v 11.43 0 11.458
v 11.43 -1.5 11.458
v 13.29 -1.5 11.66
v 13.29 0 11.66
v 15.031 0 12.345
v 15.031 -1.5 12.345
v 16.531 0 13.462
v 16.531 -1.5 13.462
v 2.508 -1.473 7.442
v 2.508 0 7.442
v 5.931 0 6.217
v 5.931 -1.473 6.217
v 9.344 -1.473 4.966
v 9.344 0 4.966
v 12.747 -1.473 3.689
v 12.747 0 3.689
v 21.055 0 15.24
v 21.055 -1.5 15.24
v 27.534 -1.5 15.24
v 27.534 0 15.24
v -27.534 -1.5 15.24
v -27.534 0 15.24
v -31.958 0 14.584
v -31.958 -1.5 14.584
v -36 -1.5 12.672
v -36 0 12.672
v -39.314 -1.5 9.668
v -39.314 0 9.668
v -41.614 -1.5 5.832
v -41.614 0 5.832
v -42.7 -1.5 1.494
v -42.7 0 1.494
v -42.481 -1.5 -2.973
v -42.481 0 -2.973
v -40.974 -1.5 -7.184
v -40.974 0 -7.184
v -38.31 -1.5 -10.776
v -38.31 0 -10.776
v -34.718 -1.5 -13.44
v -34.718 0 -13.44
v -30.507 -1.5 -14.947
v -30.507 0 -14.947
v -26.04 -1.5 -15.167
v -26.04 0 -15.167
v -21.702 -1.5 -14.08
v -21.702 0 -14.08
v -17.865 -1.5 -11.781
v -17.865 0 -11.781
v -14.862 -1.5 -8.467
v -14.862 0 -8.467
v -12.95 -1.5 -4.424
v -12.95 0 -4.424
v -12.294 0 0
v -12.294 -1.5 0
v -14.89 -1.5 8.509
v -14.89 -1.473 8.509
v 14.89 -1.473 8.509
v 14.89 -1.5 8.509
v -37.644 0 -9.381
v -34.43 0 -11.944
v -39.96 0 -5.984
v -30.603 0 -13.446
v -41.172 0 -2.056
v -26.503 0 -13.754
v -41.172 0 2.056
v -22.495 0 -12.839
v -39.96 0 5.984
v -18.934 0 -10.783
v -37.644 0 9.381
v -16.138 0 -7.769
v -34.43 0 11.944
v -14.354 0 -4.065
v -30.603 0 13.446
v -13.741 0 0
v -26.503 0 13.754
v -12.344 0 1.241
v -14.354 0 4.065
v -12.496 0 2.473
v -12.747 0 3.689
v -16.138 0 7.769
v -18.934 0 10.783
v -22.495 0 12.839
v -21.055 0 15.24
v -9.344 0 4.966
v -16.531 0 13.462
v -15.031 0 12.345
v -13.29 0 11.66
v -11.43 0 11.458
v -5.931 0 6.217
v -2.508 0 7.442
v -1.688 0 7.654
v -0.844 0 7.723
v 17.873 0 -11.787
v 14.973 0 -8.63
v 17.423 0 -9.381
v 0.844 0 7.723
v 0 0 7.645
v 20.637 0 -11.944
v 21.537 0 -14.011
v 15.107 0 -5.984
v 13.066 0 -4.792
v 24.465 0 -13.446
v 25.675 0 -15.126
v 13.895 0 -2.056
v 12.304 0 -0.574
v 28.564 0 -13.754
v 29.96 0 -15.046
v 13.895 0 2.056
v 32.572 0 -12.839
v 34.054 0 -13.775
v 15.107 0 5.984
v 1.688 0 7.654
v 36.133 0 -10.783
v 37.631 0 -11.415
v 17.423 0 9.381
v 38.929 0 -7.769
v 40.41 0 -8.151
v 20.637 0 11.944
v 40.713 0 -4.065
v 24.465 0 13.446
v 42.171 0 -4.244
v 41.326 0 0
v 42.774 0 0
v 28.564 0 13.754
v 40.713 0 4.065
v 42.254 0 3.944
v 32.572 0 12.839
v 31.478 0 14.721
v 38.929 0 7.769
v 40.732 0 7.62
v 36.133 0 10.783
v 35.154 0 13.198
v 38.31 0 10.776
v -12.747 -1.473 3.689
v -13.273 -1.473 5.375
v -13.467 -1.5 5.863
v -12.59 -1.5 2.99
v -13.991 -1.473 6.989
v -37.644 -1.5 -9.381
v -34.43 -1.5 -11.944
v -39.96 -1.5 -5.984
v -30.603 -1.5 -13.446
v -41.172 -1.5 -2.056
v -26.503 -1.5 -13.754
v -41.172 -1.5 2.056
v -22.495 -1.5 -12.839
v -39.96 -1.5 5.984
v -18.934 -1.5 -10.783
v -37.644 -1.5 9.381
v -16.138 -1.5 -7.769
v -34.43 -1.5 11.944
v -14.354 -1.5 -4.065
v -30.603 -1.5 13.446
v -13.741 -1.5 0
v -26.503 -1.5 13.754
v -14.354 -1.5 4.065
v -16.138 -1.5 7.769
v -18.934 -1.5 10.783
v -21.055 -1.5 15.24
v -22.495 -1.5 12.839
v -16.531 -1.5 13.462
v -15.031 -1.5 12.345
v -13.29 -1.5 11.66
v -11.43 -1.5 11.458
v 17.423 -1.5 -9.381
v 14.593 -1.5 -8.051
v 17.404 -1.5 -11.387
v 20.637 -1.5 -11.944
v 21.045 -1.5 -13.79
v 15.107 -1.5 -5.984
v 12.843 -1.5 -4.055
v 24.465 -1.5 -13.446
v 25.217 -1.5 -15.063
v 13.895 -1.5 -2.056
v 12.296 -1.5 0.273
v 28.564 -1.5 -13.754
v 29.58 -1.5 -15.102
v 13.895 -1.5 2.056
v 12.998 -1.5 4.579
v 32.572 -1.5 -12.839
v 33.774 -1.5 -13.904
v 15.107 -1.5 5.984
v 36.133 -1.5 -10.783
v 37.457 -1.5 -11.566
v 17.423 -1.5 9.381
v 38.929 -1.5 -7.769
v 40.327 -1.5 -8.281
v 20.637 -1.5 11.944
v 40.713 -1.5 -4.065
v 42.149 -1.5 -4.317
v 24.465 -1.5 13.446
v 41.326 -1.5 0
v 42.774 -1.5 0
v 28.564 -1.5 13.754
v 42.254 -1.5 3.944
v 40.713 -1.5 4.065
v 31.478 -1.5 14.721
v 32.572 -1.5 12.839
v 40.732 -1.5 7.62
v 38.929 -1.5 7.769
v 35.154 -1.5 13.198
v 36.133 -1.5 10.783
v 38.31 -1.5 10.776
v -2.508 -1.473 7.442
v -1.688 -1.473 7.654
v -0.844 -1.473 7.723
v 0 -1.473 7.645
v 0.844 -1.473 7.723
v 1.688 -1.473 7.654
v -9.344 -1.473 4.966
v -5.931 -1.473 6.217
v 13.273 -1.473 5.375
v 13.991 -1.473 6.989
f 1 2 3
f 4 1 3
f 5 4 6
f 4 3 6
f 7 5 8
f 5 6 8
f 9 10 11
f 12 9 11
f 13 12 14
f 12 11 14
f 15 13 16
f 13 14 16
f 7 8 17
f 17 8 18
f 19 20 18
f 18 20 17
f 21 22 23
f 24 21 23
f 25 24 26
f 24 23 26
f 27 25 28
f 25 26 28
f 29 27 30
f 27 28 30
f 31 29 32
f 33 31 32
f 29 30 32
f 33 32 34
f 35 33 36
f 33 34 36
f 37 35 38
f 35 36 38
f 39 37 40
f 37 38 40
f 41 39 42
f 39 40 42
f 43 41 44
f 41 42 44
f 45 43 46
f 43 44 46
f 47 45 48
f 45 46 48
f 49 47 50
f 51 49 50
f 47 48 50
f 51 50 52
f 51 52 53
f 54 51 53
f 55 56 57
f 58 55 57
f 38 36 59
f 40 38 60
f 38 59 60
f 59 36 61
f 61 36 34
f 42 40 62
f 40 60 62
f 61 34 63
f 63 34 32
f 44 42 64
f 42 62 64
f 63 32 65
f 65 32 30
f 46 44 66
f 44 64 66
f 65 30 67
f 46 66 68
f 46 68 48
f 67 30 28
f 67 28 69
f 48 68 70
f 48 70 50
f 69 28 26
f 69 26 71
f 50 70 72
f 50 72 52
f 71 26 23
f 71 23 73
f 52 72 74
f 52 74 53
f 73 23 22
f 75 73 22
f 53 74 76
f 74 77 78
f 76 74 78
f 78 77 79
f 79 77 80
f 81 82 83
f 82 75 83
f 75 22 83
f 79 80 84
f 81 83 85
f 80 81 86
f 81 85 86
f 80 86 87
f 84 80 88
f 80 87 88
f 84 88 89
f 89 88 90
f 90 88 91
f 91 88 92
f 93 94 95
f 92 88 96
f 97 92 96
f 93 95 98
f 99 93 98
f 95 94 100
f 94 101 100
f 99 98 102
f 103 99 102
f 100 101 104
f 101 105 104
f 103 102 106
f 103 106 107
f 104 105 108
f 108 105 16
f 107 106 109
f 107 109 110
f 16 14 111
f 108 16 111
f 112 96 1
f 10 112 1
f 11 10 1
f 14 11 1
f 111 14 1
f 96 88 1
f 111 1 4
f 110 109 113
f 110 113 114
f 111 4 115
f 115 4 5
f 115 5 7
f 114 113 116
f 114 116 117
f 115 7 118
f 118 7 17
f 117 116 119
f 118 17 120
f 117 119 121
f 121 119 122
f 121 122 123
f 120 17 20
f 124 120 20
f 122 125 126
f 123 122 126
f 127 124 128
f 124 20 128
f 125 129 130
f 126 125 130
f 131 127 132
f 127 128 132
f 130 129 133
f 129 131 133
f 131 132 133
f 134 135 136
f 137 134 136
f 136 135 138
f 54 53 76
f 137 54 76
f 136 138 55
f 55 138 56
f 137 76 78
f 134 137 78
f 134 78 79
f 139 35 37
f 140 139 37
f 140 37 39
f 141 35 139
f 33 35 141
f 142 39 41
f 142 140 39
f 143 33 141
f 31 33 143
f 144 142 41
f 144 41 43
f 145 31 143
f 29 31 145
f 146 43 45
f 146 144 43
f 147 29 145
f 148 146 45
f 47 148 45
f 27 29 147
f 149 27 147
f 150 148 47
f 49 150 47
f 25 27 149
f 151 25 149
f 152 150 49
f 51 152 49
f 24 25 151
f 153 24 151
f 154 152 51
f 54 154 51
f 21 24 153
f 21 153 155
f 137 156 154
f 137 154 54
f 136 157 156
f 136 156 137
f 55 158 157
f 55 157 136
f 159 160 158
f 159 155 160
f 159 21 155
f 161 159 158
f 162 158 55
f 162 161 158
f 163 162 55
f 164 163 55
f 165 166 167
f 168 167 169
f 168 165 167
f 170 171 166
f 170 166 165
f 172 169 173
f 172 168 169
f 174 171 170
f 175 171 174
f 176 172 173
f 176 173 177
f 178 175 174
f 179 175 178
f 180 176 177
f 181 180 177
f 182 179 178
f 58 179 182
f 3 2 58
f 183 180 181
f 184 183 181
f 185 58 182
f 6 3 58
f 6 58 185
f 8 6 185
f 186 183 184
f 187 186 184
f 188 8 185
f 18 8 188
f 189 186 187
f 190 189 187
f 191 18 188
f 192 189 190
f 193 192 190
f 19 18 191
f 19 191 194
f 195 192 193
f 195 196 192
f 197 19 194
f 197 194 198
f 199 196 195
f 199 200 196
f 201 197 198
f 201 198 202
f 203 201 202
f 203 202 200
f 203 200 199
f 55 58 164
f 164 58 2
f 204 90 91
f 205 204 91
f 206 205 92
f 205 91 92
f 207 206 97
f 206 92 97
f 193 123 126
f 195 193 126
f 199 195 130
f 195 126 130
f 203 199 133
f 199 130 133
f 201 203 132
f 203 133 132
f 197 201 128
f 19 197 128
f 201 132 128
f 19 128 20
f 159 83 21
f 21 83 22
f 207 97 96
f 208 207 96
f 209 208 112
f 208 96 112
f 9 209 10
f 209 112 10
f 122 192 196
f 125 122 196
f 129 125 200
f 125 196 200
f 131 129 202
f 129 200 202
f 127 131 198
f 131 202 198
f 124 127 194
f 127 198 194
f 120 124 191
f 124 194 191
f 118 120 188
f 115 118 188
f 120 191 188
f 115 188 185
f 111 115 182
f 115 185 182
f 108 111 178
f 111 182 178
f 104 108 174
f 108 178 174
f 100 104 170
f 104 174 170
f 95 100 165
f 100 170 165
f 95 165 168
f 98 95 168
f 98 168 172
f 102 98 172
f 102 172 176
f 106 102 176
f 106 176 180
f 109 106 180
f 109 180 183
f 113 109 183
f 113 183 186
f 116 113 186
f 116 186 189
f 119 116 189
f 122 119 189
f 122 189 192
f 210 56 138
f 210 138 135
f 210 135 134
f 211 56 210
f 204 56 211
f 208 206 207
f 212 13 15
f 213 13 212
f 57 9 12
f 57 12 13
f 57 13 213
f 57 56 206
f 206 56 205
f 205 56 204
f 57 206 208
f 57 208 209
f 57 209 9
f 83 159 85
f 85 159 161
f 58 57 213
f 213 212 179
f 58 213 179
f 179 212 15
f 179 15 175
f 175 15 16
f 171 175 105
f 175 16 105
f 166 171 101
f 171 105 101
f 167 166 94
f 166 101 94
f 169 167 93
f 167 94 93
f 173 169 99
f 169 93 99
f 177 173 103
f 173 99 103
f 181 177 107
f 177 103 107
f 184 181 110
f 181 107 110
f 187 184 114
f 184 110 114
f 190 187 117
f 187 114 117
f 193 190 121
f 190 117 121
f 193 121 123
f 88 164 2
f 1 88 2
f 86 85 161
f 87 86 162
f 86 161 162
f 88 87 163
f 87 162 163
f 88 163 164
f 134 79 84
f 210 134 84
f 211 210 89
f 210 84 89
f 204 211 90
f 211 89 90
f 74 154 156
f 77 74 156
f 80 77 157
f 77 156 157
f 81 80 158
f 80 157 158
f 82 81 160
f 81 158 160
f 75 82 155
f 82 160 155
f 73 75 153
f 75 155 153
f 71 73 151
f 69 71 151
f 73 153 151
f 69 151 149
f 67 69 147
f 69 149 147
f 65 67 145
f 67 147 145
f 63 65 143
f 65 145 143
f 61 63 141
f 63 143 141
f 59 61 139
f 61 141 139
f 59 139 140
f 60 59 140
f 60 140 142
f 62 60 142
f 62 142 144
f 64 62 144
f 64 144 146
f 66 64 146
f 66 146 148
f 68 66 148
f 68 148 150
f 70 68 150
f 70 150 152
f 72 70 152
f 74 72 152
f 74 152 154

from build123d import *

# Parameters (mm, degrees)
F1_DEPTH = 1.5
F2_R     = 13.7922
F3_DEPTH = 25.4
F5_DEPTH = 25.4
F8_DEPTH = 1.4732


# Not quite as in the source:
# - a variable given as a bare number and used for a length is read in inches; the dataset says mm whatever the document's units were


with BuildPart() as f1:
    # F0 (on Front) → F1 (new body)
    with BuildSketch(Plane.XZ):
        with BuildLine():
            ThreePointArc((-27.5336, 15.24), (-38.3099073453, -10.7763073453), (-12.2936, 0))
            ThreePointArc((-12.2936, 0), (-12.9572083605, 4.4481914045), (-14.8902413086, 8.509))
            ThreePointArc((-14.8902413086, 8.509), (-20.3718809326, 13.4524116797), (-27.5336, 15.24))
        make_face()
        with BuildLine():
            ThreePointArc((-27.5336, 15.24), (-20.3718809326, 13.4524116797), (-14.8902413086, 8.509))
            Line((-14.8902413086, 8.509), (14.8902413086, 8.509))
            ThreePointArc((14.8902413086, 8.509), (20.3718809326, 13.4524116797), (27.5336, 15.24))
            Line((27.5336, 15.24), (-27.5336, 15.24))
        make_face()
        with BuildLine():
            ThreePointArc((27.5336, 15.24), (20.3718809326, 13.4524116797), (14.8902413086, 8.509))
            ThreePointArc((14.8902413086, 8.509), (23.0854085955, -14.5763916395), (42.7736, 0))
            ThreePointArc((42.7736, 0), (38.3099073453, 10.7763073453), (27.5336, 15.24))
        make_face()
    extrude(amount=F1_DEPTH)

    # F2 (on face) → F3 (cut)
    with BuildSketch(Plane.XZ.offset(1.5)):
        with Locations((-27.5336, 0)):
            Circle(F2_R)
        with Locations((27.5336, 0)):
            Circle(F2_R)
        with BuildLine():
            Line((0, 40.3644442558), (-21.547392987, 18.4778384864))
            Line((-21.547392987, 18.4778384864), (-16.5919354635, 13.522380963))
            ThreePointArc((-16.5919354635, 13.522380963), (-14.2228731292, 11.9602304674), (-11.43, 11.4576071501))
            Line((-11.43, 11.4576071501), (0, 11.4576071501))
            Line((0, 11.4576071501), (0, 40.3644442558))
        make_face()
        with BuildLine():
            Line((21.547392987, 18.4778384864), (0, 40.3644442558))
            Line((0, 40.3644442558), (0, 11.4576071501))
            Line((0, 11.4576071501), (11.43, 11.4576071501))
            ThreePointArc((11.43, 11.4576071501), (14.2228731292, 11.9602304674), (16.5919354635, 13.522380963))
            Line((16.5919354635, 13.522380963), (21.547392987, 18.4778384864))
        make_face()
    extrude(amount=-F3_DEPTH, mode=Mode.SUBTRACT)

    # F4 (on face) → F5 (cut)
    with BuildSketch(Plane.XZ.offset(1.5)):
        Polygon((-9.2328525533, 17.0485330061), (-24.6466696262, 16.6515540332), (-11.43, 11.4576071501), align=None)
        Polygon((11.43, 11.4576071501), (24.6466696262, 16.6515540332), (9.2328525533, 17.0485330061), align=None)
    extrude(amount=-F5_DEPTH, mode=Mode.SUBTRACT)

    # F7 (on Front) → F8 (join)
    with BuildSketch(Plane.XZ):
        with BuildLine():
            ThreePointArc((-17.6120530814, 10.0212339312), (-15.0131826274, 7.0473877292), (-13.4240113708, 3.4318070584))
            ThreePointArc((-13.4240113708, 3.4318070584), (-7.9783410744, 5.4701683575), (-2.5081751928, 7.4418496173))
            ThreePointArc((-2.5081751928, 7.4418496173), (-1.2673351307, 7.7068584172), (0, 7.6454142109))
            ThreePointArc((0, 7.6454142109), (1.2673351307, 7.7068584172), (2.5081751928, 7.4418496173))
            ThreePointArc((2.5081751928, 7.4418496173), (7.9783410744, 5.4701683575), (13.4240113708, 3.4318070584))
            ThreePointArc((13.4240113708, 3.4318070584), (15.0131826274, 7.0473877292), (17.6120530814, 10.0212339312))
            Line((17.6120530814, 10.0212339312), (-17.6120530814, 10.0212339312))
        make_face()
    extrude(amount=F8_DEPTH)


solid = f1.part
